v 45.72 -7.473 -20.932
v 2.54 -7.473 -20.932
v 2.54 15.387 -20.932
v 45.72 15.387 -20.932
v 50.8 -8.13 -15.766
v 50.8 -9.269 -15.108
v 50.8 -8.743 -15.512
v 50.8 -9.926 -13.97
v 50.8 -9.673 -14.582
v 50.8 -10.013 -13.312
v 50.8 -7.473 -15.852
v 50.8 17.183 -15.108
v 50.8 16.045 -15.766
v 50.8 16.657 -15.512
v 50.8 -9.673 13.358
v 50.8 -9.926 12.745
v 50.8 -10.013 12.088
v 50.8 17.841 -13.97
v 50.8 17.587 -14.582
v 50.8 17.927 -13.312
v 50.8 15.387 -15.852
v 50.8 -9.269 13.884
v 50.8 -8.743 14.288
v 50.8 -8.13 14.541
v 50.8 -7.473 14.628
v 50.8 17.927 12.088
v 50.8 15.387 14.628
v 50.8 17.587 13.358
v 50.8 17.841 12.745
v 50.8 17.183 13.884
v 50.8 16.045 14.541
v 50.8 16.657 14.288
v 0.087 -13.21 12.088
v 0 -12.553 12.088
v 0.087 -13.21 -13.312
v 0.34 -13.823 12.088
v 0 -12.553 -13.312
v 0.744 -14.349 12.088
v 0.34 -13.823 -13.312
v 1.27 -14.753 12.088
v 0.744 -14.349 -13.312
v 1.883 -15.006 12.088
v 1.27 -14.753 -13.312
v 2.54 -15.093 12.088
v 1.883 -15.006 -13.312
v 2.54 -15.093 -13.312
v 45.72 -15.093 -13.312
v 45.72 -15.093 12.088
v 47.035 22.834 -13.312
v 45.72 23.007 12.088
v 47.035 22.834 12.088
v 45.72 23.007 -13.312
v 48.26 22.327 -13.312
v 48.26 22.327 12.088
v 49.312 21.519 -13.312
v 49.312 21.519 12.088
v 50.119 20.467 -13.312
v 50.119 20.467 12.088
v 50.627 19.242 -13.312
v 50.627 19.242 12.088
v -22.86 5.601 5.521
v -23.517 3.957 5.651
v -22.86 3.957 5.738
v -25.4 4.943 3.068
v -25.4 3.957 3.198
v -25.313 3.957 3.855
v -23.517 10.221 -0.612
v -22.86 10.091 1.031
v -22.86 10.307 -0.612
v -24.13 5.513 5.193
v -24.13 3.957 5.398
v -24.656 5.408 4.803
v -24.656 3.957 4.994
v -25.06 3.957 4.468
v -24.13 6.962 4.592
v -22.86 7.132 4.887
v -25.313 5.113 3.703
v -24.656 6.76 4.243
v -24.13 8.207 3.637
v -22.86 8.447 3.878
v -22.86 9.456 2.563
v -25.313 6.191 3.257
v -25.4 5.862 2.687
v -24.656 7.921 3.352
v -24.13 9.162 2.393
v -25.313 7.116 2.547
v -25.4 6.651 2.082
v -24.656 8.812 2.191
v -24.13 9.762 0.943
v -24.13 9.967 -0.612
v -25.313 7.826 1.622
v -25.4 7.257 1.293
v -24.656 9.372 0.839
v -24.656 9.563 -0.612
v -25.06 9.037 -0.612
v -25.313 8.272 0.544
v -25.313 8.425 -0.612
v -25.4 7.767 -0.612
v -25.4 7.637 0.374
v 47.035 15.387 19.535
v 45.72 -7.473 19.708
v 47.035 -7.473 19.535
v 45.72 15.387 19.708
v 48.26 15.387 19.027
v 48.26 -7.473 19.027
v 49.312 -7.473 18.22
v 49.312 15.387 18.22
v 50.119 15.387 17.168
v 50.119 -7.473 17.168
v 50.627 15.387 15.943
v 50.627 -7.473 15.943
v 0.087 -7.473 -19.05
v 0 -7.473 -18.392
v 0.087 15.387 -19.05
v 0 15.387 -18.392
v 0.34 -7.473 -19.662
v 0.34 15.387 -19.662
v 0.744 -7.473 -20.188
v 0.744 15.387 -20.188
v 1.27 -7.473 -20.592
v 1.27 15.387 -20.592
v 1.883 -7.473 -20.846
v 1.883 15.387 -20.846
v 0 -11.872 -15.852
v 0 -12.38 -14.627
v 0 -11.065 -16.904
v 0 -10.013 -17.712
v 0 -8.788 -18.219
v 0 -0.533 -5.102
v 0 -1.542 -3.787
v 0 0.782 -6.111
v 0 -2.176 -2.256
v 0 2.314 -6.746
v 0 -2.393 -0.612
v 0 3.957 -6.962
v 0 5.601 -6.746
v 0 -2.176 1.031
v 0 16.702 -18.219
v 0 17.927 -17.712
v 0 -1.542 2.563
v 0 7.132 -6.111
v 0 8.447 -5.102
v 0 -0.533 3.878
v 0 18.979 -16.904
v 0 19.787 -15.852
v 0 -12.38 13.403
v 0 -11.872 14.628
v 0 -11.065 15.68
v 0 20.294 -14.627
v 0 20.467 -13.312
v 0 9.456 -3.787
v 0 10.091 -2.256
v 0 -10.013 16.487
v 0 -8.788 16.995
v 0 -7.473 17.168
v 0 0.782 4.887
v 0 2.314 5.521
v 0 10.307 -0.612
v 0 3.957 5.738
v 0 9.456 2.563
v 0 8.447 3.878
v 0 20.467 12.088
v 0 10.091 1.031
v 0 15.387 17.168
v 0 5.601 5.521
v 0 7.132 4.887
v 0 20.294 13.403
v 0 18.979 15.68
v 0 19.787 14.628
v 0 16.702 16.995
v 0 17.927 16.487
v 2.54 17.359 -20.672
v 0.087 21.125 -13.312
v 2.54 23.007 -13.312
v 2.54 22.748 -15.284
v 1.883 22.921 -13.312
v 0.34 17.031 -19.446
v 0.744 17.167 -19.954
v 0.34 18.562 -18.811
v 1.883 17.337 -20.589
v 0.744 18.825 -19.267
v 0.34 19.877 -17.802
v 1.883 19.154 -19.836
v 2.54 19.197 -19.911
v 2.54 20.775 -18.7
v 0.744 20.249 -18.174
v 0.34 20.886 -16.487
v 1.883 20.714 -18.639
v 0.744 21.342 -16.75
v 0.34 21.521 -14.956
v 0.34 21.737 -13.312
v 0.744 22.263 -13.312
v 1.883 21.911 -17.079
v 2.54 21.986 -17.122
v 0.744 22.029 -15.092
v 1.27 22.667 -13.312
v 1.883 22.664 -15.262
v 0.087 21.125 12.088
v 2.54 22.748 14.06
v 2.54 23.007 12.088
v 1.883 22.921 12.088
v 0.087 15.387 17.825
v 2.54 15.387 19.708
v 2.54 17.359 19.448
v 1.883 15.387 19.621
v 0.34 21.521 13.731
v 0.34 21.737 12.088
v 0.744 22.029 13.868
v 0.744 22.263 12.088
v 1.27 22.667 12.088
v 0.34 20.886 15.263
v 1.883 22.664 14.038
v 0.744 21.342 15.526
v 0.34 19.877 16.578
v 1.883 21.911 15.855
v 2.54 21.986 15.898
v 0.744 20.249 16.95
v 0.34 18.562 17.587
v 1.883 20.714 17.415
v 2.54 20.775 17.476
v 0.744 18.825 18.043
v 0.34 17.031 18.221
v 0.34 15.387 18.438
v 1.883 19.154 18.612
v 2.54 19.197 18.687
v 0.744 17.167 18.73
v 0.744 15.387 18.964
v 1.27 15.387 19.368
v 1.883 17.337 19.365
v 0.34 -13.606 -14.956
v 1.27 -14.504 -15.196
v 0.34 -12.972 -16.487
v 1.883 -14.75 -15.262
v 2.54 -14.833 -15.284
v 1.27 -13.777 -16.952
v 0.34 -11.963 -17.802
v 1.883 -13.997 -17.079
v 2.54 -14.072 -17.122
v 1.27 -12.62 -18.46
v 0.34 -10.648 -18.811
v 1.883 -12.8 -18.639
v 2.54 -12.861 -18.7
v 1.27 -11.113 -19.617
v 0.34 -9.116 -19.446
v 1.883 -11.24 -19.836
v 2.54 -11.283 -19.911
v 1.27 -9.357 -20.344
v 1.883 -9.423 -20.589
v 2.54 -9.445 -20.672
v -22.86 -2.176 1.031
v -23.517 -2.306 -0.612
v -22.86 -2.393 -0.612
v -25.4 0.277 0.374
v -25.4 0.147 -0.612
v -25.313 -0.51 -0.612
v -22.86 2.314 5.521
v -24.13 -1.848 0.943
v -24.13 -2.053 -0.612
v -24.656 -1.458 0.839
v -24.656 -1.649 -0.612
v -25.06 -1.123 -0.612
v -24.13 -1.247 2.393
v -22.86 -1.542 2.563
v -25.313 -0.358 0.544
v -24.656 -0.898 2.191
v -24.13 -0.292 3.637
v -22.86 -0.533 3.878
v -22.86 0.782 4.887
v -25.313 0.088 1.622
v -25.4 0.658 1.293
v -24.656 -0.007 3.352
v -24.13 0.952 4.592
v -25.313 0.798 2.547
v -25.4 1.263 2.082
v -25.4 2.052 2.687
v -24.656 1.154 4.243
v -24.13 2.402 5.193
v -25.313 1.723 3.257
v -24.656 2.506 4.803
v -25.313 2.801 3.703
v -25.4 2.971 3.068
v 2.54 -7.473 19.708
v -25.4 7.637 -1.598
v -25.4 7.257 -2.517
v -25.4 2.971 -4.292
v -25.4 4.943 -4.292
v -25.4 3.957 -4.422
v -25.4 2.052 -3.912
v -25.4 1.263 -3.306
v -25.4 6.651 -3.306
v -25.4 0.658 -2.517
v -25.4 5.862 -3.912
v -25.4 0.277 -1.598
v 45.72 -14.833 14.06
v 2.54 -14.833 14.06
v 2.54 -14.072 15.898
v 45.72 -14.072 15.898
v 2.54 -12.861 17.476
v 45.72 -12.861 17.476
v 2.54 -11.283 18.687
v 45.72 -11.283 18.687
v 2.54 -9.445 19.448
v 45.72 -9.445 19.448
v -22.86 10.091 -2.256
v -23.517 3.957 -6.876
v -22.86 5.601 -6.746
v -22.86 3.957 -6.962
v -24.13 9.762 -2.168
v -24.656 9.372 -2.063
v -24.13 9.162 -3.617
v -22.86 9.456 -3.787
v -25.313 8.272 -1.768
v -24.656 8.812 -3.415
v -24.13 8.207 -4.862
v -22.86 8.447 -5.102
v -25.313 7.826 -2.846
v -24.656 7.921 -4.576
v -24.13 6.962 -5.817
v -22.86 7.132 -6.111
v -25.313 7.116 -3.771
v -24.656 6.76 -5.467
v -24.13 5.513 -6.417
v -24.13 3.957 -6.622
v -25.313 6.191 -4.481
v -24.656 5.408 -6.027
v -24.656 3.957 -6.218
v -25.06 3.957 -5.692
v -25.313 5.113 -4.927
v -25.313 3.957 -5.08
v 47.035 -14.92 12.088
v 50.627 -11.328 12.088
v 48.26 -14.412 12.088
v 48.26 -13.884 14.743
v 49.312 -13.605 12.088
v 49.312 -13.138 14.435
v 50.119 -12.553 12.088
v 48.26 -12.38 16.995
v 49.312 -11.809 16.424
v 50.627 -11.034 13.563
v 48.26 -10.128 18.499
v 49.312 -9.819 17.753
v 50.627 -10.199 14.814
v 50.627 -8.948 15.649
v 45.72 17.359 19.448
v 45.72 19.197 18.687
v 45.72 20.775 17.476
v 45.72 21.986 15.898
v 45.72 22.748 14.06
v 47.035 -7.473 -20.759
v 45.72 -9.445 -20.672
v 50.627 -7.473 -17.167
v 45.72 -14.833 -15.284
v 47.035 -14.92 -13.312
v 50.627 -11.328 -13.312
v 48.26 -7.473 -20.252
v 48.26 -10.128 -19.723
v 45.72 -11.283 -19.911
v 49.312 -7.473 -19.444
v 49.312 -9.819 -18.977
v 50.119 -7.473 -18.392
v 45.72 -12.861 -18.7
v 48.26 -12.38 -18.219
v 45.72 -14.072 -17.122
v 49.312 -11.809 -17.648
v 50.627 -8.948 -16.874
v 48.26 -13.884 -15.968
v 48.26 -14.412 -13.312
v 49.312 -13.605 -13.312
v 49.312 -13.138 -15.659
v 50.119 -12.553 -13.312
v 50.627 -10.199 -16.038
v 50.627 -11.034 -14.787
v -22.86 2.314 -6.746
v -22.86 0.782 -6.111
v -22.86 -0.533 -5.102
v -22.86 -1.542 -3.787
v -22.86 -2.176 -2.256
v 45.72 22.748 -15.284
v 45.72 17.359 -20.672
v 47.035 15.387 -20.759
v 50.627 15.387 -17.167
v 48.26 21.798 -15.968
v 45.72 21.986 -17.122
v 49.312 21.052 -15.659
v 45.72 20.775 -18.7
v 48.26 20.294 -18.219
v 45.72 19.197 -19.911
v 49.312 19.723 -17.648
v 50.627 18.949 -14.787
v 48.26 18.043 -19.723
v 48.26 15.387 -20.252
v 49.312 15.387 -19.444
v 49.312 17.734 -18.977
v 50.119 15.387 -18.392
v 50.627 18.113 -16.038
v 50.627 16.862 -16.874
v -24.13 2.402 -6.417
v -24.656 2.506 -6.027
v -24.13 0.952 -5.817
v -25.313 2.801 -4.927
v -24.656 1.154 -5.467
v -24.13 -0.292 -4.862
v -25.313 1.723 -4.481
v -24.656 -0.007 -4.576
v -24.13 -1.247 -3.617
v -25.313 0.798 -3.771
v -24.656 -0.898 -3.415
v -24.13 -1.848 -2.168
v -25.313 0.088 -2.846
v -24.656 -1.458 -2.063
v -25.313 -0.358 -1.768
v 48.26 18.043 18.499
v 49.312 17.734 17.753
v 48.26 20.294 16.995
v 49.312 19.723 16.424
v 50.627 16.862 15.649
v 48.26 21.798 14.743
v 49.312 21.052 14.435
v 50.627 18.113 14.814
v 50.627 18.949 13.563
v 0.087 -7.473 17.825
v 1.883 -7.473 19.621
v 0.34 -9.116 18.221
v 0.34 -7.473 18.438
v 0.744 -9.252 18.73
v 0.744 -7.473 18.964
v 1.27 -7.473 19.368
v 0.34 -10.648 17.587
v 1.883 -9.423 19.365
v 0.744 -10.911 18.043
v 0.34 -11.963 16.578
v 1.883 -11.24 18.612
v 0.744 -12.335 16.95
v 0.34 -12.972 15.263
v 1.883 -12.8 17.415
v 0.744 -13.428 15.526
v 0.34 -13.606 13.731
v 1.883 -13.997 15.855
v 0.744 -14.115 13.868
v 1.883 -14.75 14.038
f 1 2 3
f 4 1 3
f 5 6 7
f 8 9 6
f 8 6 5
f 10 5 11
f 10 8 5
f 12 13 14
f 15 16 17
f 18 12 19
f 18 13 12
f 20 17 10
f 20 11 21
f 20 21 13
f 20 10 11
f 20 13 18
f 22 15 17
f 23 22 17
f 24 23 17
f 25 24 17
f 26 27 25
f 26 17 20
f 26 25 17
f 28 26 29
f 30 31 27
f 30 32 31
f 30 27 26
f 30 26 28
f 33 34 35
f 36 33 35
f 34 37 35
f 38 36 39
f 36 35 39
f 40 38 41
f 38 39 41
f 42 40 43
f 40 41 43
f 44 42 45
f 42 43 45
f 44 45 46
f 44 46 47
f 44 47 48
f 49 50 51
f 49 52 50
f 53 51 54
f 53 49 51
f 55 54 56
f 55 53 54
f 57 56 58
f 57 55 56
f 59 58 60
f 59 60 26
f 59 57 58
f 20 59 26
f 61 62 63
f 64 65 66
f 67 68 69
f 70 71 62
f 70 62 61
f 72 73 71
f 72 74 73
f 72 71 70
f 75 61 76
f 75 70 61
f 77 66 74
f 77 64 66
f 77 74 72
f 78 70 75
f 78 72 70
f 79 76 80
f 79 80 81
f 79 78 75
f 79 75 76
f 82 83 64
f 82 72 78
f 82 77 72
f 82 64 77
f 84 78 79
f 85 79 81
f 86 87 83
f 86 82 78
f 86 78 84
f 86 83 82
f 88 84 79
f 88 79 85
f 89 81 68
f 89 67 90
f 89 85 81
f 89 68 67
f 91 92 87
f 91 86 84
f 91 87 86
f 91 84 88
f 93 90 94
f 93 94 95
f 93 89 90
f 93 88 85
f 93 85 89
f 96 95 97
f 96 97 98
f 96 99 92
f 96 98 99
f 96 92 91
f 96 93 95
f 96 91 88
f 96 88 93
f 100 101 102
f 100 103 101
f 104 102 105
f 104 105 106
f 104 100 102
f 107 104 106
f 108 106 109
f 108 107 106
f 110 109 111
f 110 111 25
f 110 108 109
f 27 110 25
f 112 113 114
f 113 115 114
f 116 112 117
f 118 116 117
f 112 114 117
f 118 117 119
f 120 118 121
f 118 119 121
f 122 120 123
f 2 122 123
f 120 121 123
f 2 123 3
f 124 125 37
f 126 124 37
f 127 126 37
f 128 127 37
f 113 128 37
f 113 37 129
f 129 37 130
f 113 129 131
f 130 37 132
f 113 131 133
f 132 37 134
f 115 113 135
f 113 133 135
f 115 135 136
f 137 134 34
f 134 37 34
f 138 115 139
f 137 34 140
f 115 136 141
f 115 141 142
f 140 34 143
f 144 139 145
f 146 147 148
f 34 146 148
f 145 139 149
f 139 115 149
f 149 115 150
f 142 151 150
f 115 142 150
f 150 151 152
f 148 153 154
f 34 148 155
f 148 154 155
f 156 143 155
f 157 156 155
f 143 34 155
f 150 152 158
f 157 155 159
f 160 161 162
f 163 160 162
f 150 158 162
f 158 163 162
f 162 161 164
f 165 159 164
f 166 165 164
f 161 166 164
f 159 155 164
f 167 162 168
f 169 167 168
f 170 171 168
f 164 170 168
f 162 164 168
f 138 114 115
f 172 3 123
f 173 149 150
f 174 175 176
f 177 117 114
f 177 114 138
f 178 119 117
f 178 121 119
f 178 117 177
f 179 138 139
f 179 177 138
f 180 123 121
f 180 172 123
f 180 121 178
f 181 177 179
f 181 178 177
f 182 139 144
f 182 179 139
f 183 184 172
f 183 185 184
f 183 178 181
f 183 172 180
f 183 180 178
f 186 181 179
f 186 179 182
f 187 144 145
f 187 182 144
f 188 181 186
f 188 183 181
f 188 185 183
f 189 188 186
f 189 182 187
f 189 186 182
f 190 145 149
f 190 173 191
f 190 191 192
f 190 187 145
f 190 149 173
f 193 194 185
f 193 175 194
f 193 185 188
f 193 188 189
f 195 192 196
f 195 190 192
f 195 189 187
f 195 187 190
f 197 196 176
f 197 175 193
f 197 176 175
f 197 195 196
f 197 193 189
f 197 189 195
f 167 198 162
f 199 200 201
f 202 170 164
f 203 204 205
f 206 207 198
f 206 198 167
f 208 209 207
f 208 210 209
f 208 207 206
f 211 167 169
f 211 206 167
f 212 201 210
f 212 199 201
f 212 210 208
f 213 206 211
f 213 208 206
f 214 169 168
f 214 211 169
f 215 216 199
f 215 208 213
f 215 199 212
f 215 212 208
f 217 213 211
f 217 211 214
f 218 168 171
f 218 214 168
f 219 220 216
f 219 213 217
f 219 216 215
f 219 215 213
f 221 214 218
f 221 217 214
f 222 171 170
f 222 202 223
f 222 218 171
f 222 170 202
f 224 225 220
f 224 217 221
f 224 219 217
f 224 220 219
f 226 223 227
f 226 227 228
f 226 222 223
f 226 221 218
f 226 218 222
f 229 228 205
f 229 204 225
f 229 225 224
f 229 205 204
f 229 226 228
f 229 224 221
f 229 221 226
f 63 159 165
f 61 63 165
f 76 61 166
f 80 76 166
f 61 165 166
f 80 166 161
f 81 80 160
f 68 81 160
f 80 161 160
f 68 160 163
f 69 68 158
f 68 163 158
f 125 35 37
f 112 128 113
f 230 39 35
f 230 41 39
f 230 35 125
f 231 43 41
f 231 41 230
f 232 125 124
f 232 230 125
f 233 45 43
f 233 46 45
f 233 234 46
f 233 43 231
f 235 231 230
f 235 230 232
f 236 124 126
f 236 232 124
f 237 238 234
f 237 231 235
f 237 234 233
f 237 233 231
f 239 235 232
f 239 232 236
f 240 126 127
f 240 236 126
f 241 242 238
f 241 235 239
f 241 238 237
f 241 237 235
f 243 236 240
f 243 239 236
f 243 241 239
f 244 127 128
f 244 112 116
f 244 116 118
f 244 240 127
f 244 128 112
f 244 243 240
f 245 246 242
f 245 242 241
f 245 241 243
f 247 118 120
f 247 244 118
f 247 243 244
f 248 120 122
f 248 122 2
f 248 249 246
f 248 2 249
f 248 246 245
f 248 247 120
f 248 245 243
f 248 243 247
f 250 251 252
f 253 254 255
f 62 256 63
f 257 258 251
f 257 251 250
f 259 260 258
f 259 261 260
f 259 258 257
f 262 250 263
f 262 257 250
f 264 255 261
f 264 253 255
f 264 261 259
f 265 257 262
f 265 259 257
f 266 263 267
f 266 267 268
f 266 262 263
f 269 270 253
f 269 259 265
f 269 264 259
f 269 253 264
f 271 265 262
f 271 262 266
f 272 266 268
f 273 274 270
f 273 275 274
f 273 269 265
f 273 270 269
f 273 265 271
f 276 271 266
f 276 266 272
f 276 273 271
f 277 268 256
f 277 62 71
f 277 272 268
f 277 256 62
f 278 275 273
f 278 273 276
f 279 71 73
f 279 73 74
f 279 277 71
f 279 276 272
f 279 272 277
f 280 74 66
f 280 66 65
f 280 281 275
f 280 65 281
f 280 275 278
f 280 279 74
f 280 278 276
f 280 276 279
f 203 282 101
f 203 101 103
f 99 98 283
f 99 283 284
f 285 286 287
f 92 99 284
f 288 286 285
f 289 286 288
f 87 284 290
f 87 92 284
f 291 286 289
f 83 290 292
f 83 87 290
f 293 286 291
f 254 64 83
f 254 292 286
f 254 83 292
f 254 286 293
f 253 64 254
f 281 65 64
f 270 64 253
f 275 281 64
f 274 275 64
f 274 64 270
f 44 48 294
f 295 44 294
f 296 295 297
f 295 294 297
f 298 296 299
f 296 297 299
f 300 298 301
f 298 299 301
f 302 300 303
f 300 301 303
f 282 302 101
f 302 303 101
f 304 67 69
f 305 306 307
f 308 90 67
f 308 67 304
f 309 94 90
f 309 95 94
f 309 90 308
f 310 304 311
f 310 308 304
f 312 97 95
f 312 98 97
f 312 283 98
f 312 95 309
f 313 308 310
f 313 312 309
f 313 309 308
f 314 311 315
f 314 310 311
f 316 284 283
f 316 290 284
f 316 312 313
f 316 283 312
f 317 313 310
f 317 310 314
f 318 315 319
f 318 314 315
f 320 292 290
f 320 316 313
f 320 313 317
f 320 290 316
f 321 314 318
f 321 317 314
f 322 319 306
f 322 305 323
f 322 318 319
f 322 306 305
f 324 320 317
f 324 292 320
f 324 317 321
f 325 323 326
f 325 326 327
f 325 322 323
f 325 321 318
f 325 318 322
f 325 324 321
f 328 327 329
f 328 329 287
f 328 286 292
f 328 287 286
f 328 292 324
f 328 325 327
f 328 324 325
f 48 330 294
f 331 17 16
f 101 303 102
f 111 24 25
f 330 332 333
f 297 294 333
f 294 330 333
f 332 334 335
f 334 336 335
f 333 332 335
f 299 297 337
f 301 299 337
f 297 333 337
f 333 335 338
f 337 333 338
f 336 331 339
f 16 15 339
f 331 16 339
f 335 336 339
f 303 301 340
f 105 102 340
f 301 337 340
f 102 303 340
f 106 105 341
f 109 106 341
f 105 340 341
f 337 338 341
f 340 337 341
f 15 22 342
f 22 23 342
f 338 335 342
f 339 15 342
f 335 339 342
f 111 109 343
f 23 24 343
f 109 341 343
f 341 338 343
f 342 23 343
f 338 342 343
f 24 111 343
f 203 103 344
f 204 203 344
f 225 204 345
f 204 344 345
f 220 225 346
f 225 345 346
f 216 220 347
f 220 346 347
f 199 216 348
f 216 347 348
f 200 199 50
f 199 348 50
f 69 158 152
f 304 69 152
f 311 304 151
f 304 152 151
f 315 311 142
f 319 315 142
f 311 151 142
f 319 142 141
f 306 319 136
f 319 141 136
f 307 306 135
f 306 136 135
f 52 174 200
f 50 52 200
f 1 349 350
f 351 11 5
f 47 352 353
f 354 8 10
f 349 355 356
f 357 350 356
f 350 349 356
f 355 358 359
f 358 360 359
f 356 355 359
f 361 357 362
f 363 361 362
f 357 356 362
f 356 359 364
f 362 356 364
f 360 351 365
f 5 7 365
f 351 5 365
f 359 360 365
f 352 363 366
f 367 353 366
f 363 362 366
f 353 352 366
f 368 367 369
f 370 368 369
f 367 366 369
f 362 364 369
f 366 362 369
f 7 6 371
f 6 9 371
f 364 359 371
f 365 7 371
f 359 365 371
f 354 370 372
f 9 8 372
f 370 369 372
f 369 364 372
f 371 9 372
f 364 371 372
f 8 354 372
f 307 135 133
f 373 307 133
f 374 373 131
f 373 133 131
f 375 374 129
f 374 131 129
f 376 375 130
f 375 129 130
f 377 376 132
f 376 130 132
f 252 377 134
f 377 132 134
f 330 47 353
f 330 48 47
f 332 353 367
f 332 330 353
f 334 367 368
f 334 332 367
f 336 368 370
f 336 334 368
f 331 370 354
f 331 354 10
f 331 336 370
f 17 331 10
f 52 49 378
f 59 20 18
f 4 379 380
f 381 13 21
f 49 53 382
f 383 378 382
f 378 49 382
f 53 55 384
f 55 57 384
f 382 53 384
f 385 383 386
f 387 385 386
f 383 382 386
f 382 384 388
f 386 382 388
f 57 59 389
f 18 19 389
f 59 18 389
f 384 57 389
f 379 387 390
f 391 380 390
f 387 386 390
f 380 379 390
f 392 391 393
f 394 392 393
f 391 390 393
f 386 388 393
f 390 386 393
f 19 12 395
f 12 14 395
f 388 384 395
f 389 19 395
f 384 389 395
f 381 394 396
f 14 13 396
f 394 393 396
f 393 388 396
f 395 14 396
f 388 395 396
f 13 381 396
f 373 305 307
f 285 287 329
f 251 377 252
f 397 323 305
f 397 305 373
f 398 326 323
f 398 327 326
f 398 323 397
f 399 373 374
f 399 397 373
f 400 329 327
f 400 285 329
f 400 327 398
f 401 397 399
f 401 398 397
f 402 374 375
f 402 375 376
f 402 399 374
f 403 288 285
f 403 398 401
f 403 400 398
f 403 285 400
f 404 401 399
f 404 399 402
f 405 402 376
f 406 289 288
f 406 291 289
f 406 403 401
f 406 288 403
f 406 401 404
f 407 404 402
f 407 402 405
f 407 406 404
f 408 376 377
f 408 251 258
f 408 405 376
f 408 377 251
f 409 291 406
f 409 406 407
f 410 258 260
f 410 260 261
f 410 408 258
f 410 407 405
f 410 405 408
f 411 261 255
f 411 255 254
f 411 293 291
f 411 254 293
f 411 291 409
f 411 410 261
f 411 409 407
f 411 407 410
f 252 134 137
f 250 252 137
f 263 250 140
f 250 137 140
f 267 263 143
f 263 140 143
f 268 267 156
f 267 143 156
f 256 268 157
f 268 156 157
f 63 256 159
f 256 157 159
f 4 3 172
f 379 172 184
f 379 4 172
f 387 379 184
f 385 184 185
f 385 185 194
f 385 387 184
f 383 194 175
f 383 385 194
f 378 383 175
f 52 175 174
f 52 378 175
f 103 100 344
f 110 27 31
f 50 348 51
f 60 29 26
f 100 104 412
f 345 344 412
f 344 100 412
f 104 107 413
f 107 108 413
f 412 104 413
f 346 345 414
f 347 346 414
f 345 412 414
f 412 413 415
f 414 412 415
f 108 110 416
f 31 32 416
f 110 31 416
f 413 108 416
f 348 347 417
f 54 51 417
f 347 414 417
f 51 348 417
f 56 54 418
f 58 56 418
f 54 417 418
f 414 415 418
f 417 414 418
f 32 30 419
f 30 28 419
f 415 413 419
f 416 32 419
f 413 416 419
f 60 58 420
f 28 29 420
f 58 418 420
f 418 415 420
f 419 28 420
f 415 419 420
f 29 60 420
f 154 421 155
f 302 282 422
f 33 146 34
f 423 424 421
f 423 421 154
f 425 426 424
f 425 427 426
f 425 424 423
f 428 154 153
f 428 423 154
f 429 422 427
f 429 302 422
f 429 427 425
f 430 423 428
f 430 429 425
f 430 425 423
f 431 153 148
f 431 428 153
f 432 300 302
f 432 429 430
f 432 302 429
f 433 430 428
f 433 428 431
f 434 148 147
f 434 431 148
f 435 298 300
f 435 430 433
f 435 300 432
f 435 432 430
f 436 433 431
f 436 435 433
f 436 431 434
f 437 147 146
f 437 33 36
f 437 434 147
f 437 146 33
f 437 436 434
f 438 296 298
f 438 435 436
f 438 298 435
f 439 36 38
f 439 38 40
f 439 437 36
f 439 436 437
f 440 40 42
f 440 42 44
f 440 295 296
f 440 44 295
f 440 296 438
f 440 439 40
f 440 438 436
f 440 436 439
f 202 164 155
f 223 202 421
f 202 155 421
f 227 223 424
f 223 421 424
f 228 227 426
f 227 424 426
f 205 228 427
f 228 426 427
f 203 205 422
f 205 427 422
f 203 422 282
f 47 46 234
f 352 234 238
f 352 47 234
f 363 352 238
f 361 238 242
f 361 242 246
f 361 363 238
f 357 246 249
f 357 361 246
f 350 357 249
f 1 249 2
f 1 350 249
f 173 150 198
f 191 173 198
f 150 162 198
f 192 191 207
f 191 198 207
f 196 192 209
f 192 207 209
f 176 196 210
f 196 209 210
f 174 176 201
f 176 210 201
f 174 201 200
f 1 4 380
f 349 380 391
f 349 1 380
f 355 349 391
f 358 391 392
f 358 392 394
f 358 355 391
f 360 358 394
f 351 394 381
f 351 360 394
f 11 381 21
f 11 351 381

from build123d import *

# Parameters (mm, degrees)
F0_W     = 38.1
F0_H     = 40.64
F1_DEPTH = 50.8
F3_DEPTH = 25.4
F4_R     = 7.62
F5_R     = 2.54
F6_R     = 2.54
F7_R     = 5.08


with BuildPart() as f1:
    # F0 (on Right) → F1 (new body)
    with BuildSketch(Plane.YZ):
        with Locations((3.9571700618, -0.6121383074)):
            Rectangle(F0_W, F0_H)
    extrude(amount=F1_DEPTH)

    # F2 (on face) → F3 (join)
    with BuildSketch(Plane(origin=(0, 0, 0), x_dir=(0, -1, 0), z_dir=(-1, 0, 0))):
        with BuildLine():
            Line((-3.9571700618, -6.9621383074), (-3.9571700618, -0.6121383074))
            Line((-3.9571700618, -0.6121383074), (-10.3071700618, -0.6121383074))
            ThreePointArc((-10.3071700618, -0.6121383074), (-8.4472981223, -5.1022663679), (-3.9571700618, -6.9621383074))
        make_face()
        with BuildLine():
            ThreePointArc((-3.9571700618, -6.9621383074), (0.5329579988, -5.1022663679), (2.3928299382, -0.6121383074))
            Line((2.3928299382, -0.6121383074), (-3.9571700618, -0.6121383074))
            Line((-3.9571700618, -0.6121383074), (-3.9571700618, -6.9621383074))
        make_face()
        with BuildLine():
            Line((-10.3071700618, -0.6121383074), (-3.9571700618, -0.6121383074))
            Line((-3.9571700618, -0.6121383074), (-3.9571700618, 5.7378616926))
            ThreePointArc((-3.9571700618, 5.7378616926), (-8.4472981223, 3.8779897531), (-10.3071700618, -0.6121383074))
        make_face()
        with BuildLine():
            Line((-3.9571700618, -0.6121383074), (2.3928299382, -0.6121383074))
            ThreePointArc((2.3928299382, -0.6121383074), (0.5329579988, 3.8779897531), (-3.9571700618, 5.7378616926))
            Line((-3.9571700618, 5.7378616926), (-3.9571700618, -0.6121383074))
        make_face()
    extrude(amount=F3_DEPTH)

    # F4
    f4_edges = [f1.edges().sort_by_distance(p)[0] for p in [
        (25.4, 23.00717, -20.932138),
        (25.4, -15.09283, -20.932138),
        (25.4, -15.09283, 19.707862),
        (25.4, 23.00717, 19.707862),
    ]]
    fillet(f4_edges, radius=F4_R)

    # F5
    f5_edges = [f1.edges().sort_by_distance(p)[0] for p in [
        (0, 3.95717, -20.932138),
    ]]
    fillet(f5_edges, radius=F5_R)

    # F6
    f6_edges = [f1.edges().sort_by_distance(p)[0] for p in [
        (-25.4, 10.30717, -0.612138),
    ]]
    fillet(f6_edges, radius=F6_R)

    # F7
    f7_edges = [f1.edges().sort_by_distance(p)[0] for p in [
        (50.8, 3.95717, 19.707862),
        (50.8, -12.860984, 17.476015),
        (50.8, -15.09283, -0.612138),
        (50.8, -12.860984, -18.700292),
        (50.8, 3.95717, -20.932138),
        (50.8, 23.00717, -0.612138),
        (50.8, 20.775324, 17.476015),
        (50.8, 20.775324, -18.700292),
    ]]
    fillet(f7_edges, radius=F7_R)


solid = f1.part
